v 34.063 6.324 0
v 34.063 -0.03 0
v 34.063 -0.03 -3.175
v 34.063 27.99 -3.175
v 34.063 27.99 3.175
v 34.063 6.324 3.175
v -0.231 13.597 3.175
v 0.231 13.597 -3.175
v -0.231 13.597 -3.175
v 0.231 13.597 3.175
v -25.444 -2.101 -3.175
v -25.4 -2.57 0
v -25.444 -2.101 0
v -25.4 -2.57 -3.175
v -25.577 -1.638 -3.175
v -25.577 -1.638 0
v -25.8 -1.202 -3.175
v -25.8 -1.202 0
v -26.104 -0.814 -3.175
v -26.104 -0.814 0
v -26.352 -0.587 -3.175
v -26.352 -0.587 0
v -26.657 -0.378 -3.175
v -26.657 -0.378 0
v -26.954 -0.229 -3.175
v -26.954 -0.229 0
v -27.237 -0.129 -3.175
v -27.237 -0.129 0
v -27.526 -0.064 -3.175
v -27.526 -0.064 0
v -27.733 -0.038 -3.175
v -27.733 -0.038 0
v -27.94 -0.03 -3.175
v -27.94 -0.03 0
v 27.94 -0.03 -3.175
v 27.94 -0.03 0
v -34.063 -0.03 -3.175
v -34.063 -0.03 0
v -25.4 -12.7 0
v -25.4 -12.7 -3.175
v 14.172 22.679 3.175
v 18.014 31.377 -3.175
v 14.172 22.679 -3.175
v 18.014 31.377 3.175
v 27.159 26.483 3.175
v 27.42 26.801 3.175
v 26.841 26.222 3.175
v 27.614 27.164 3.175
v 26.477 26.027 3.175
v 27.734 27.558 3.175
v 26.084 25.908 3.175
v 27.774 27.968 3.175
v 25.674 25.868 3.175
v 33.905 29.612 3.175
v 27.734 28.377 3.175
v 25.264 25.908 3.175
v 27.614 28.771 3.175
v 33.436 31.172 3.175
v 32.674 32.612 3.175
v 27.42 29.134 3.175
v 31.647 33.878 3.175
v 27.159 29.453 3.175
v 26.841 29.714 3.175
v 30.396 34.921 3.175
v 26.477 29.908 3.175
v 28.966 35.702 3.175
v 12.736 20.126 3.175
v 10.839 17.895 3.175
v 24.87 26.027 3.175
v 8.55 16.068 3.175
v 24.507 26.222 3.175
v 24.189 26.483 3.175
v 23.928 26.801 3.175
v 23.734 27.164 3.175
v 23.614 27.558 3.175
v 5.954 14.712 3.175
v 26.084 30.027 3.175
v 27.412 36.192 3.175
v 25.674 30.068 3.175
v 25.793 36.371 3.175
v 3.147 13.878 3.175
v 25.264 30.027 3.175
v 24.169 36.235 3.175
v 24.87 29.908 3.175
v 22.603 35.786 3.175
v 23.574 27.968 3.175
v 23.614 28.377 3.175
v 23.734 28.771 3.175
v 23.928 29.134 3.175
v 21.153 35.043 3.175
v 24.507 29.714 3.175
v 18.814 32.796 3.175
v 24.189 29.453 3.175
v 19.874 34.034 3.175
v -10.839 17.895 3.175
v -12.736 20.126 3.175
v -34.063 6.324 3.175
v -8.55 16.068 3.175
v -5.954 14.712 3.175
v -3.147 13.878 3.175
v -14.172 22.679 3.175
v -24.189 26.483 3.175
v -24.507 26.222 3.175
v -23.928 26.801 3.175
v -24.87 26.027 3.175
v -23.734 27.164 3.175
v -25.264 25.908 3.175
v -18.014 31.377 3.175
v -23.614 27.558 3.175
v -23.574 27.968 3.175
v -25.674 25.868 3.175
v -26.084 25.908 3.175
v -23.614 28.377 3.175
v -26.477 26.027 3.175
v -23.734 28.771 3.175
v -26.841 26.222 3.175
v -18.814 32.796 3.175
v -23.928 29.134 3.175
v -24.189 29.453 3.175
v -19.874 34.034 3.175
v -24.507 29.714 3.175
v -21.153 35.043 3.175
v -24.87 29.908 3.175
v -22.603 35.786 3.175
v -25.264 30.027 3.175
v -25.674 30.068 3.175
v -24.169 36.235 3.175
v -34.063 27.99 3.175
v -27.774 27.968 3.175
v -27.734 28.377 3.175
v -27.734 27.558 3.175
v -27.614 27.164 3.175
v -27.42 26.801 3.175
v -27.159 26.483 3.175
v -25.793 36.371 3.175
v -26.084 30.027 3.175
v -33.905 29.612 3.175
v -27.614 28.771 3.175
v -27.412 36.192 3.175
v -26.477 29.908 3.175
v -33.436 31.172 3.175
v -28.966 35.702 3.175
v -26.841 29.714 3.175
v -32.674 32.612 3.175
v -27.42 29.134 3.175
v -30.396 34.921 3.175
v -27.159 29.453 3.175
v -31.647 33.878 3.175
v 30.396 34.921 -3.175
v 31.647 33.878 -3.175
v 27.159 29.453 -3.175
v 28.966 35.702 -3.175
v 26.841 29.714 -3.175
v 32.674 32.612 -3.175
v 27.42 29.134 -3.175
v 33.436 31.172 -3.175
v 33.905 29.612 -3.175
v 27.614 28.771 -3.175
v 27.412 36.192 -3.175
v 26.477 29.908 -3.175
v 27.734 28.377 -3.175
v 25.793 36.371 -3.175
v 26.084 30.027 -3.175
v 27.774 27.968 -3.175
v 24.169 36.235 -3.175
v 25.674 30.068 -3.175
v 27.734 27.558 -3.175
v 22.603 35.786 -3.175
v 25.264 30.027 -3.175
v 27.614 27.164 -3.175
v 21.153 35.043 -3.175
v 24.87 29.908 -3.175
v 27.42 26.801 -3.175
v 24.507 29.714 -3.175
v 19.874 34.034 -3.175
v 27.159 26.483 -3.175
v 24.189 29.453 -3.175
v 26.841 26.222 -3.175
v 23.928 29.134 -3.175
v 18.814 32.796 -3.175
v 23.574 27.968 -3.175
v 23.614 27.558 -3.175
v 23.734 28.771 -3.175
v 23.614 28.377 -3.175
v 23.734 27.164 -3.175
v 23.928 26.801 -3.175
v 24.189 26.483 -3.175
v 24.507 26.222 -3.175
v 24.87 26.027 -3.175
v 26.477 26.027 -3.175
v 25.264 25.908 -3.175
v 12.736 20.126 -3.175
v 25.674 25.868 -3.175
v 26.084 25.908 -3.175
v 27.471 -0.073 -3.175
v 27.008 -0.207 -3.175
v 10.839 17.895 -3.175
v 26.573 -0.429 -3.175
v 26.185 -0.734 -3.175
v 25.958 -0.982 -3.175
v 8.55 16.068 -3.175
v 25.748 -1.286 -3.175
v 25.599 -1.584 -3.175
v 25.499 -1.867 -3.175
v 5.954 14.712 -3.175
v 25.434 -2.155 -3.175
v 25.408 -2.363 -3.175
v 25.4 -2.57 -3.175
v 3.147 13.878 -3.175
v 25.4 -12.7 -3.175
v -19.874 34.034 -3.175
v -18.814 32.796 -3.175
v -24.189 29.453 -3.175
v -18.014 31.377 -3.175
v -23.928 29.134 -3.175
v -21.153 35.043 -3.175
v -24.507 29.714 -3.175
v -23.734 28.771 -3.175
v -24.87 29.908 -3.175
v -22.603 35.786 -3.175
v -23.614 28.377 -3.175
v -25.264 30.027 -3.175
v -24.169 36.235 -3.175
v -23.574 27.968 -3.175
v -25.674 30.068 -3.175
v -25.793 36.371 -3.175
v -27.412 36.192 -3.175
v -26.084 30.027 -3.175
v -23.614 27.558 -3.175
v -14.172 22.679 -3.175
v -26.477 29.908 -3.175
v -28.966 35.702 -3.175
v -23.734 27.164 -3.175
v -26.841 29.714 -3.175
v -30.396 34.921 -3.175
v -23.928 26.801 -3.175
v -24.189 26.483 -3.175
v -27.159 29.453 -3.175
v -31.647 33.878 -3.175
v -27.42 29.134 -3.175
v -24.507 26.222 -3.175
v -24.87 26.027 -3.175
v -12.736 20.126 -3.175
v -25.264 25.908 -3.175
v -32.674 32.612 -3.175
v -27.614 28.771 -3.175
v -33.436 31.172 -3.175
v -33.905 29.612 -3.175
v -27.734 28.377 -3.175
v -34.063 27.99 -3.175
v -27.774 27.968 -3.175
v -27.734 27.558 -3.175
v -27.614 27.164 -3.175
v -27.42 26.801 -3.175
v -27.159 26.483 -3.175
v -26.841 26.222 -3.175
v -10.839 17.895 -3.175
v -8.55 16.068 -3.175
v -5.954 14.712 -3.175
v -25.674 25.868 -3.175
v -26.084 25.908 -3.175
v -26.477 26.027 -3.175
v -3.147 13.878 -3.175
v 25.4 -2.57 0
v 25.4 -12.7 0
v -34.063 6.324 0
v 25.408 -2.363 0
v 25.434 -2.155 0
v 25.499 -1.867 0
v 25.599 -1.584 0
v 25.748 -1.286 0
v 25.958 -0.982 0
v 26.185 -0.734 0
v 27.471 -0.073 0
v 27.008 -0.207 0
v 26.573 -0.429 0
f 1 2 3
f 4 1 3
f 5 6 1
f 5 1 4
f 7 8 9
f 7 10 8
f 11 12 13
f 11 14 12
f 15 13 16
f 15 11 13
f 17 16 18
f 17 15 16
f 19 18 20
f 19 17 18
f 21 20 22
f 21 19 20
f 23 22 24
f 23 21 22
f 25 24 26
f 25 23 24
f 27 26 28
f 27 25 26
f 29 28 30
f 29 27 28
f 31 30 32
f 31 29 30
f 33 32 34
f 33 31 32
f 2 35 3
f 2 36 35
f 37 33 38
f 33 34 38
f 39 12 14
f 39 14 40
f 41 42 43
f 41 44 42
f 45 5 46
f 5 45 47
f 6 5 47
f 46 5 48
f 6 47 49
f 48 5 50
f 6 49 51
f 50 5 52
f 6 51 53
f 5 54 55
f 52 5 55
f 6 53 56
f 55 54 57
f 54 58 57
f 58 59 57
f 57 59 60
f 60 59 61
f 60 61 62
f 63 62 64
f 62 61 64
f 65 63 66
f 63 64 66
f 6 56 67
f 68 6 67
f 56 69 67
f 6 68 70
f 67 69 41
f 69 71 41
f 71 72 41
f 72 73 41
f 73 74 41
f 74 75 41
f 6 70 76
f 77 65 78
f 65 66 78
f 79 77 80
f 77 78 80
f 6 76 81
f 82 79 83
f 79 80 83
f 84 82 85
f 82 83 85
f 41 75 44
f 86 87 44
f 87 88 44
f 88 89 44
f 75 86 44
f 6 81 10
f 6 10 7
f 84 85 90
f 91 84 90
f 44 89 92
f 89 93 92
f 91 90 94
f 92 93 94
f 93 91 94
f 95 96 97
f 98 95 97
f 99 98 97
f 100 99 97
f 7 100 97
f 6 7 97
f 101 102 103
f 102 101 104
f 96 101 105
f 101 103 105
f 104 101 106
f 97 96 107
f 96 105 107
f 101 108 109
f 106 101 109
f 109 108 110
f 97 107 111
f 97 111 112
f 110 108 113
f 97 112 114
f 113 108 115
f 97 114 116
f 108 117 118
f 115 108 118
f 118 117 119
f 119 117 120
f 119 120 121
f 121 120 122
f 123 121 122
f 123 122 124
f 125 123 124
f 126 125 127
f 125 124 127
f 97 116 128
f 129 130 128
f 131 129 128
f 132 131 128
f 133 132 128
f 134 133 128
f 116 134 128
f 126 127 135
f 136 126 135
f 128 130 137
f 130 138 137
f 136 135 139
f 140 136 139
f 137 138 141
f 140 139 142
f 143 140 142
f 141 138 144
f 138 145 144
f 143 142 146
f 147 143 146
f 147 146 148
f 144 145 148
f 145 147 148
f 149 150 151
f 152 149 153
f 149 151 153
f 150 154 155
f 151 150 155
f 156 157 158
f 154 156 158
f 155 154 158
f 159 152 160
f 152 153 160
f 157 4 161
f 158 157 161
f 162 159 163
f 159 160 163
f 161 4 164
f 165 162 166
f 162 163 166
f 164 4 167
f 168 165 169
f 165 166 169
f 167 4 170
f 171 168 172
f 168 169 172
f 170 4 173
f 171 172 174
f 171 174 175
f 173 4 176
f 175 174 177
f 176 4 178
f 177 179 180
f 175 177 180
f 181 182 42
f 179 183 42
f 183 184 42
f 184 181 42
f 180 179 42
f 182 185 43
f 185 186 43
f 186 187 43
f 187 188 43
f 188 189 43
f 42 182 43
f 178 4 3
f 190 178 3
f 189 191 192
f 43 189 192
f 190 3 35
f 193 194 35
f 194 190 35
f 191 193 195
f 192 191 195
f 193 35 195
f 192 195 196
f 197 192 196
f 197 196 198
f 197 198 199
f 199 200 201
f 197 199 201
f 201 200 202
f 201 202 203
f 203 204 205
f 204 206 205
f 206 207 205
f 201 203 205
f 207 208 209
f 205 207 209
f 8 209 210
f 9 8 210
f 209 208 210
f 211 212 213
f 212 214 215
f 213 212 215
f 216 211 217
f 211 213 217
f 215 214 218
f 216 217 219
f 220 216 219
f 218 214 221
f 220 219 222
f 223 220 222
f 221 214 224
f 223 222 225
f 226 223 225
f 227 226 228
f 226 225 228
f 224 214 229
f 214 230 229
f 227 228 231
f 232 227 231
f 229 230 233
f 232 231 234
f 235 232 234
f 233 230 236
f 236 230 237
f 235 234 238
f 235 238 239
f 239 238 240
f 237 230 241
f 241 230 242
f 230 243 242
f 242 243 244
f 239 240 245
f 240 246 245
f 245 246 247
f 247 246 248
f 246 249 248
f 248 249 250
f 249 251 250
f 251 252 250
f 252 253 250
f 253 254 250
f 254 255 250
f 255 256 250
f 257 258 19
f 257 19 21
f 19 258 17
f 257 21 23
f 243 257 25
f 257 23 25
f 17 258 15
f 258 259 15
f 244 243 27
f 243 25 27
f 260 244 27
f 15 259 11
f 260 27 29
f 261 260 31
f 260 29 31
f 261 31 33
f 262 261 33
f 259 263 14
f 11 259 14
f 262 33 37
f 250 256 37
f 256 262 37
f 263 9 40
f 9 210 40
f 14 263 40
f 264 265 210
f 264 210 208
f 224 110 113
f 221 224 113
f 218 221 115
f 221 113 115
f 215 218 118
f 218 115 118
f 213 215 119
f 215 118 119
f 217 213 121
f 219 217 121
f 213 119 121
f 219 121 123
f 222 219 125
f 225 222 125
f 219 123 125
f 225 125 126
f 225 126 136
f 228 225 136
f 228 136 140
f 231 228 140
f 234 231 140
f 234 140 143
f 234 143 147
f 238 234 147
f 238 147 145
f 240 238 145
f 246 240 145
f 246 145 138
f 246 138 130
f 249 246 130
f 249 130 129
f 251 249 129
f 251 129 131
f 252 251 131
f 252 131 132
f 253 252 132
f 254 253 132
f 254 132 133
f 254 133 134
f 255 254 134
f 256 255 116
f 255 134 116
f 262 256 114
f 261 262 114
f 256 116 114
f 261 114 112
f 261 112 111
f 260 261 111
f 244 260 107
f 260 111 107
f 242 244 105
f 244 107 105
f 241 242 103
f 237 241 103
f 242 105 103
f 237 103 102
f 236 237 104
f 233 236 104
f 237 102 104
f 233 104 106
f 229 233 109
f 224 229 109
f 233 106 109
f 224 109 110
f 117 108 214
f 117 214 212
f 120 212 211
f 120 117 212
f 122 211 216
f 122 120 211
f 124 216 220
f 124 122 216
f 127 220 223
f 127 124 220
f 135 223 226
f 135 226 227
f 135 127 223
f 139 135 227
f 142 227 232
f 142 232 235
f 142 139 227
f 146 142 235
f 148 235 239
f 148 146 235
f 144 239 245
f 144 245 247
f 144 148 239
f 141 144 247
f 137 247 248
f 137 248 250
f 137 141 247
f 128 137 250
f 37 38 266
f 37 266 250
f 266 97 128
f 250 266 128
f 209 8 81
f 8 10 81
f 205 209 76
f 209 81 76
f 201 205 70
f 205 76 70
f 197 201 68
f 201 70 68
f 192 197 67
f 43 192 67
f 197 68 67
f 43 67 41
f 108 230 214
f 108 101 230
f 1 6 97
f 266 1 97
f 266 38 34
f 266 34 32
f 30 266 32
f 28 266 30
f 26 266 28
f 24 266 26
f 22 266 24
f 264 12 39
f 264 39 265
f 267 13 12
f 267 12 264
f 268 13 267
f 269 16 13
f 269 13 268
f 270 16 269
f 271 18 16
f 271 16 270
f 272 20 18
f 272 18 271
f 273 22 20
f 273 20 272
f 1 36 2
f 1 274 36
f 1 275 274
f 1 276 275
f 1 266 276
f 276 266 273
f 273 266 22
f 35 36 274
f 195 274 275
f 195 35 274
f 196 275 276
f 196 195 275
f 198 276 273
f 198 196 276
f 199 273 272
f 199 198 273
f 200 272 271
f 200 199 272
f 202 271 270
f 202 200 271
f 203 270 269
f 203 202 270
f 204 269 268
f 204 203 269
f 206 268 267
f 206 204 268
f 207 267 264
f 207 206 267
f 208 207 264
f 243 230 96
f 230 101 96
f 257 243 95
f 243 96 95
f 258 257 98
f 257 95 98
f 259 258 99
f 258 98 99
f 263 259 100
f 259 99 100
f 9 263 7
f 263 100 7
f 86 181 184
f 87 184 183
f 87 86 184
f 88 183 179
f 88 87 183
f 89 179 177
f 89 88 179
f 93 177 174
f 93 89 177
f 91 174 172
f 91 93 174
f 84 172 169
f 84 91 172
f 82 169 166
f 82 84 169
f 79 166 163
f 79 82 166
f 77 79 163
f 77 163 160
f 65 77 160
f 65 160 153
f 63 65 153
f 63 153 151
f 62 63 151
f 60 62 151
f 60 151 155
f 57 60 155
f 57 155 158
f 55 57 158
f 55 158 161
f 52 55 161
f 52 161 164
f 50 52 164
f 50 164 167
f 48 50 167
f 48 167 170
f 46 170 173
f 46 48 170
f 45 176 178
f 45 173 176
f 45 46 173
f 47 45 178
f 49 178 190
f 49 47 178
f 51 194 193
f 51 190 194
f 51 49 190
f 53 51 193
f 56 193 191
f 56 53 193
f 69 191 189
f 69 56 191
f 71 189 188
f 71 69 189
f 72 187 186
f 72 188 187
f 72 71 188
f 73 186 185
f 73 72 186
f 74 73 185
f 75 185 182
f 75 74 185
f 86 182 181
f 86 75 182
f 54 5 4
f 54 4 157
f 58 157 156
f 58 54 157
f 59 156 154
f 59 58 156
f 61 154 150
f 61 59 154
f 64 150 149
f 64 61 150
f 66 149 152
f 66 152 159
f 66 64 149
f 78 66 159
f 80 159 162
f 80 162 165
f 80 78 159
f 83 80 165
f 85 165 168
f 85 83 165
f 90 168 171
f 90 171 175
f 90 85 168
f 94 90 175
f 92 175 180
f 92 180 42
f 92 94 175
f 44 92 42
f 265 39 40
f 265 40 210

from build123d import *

# Parameters (mm, degrees)
BOSS_EXTRU_1_DEPTH             = 3.175
ESQUISSE3_R                    = 2.1
ENL_V_MAT_EXTRU_1_DEPTH        = 51.235046687
ENL_V_MAT_EXTRU_2_DEPTH        = 3.175
CONG_1_R                       = 15.24
CONG_2_R                       = 15.24
BOSS_EXTRU_3_REACH             = 51.933
BOSS_EXTRU_3_DIRECTION_2_REACH = 51.933
ENL_V_MAT_EXTRU_3_DEPTH        = 3.175
CONG_3_R                       = 2.54


with BuildPart() as part:
    # Esquisse2 → Boss.-Extru.1 (new, symmetric)
    with BuildSketch(Plane.XY):
        with BuildLine():
            Line((25.4, 0), (33.652960284, 25.4))
            ThreePointArc((33.652960284, 25.4), (28.67359617, 35.819836664), (18.013926444, 31.377032999))
            Line((18.013926444, 31.377032999), (10.16, 13.597032999))
            Line((10.16, 13.597032999), (-10.16, 13.597032999))
            Line((-10.16, 13.597032999), (-18.013926444, 31.377032999))
            ThreePointArc((-18.013926444, 31.377032999), (-28.67359617, 35.819836664), (-33.652960284, 25.4))
            Line((-33.652960284, 25.4), (-25.4, 0))
            Line((-25.4, 0), (-25.4, -12.7))
            Line((-25.4, -12.7), (25.4, -12.7))
            Line((25.4, -12.7), (25.4, 0))
        make_face()
    extrude(amount=BOSS_EXTRU_1_DEPTH, both=True)

    # Esquisse3 → Enlèv. mat.-Extru.1 (cut, through all)
    with BuildSketch(Plane.XY.offset(3.175)):
        with Locations((-25.673864308, 27.96758946)):
            Circle(ESQUISSE3_R)
    enl_v_mat_extru_1 = extrude(amount=-ENL_V_MAT_EXTRU_1_DEPTH, mode=Mode.SUBTRACT)

    # Symétrie1: Enlèv. mat.-Extru.1 across plane
    add(enl_v_mat_extru_1.mirror(Plane(origin=(0, 0, 0), x_dir=(0, 0, 1), z_dir=(1, 0, 0))), mode=Mode.SUBTRACT)

    # Esquisse4 → Enlèv. mat.-Extru.2 (cut)
    with BuildSketch(Plane.XY.offset(3.175)):
        Polygon((27.454849211, 6.324175587), (-27.454849211, 6.324175587), (-25.4, 0), (-25.4, -12.7), (25.4, -12.7), (25.4, 0), align=None)
    extrude(amount=-ENL_V_MAT_EXTRU_2_DEPTH, mode=Mode.SUBTRACT)

    # Congé1
    cong_1_edges = [part.edges().sort_by_distance(p)[0] for p in [
        (-10.16, 13.597032999, 0),
        (10.16, 13.597032999, 0),
    ]]
    fillet(cong_1_edges, radius=CONG_1_R)

    # Congé2
    cong_2_edges = [part.edges().sort_by_distance(p)[0] for p in [
        (-25.4, 0, -1.5875),
        (25.4, 0, -1.5875),
    ]]
    fillet(cong_2_edges, radius=CONG_2_R)

    # Boss.-Extru.3: up to this face of the body (flat: up to its plane)
    boss_extru_3_end = Plane(part.part.faces().sort_by_distance((-16.773966377, 26.7272166, 3.175))[0])
    # Esquisse8 → Boss.-Extru.3 (add, up to the picked face)
    with BuildSketch(Plane.XY, mode=Mode.PRIVATE) as boss_extru_3_sk1:
        with BuildLine():
            Line((-27.454849211, 6.324175587), (-26.145898692, 2.295640124))
            ThreePointArc((-26.145898692, 2.295640124), (-25.821082413, 1.143928475), (-25.587629689, -0.029717623))
            Line((-25.587629689, -0.029717623), (-34.063204565, -0.029717623))
            Line((-34.063204565, -0.029717623), (-34.063204565, 27.990180447))
            ThreePointArc((-34.063204565, 27.990180447), (-33.960008236, 26.678946761), (-33.652960284, 25.4))
            Line((-33.652960284, 25.4), (-27.454849211, 6.324175587))
        make_face()
    boss_extru_3_tool1 = split(extrude(boss_extru_3_sk1.sketch, amount=BOSS_EXTRU_3_REACH, mode=Mode.PRIVATE), bisect_by=boss_extru_3_end, keep=Keep.BOTH, mode=Mode.PRIVATE)
    boss_extru_3 = boss_extru_3_tool1.solids().sort_by(Axis((-31.181863, 8.892932, 0), (0, 0, 1)))[0]
    add(boss_extru_3)

    # Boss.-Extru.3 direction 2: up to this face of the body (flat: up to its plane)
    boss_extru_3_direction_2_end = Plane(part.part.faces().sort_by_distance((0, 8.816587411, -3.175))[0])
    # Esquisse8 → Boss.-Extru.3 direction 2 (add, up to the picked face)
    with BuildSketch(Plane.XY, mode=Mode.PRIVATE) as boss_extru_3_direction_2_sk1:
        with BuildLine():
            Line((-27.454849211, 6.324175587), (-26.145898692, 2.295640124))
            ThreePointArc((-26.145898692, 2.295640124), (-25.821082413, 1.143928475), (-25.587629689, -0.029717623))
            Line((-25.587629689, -0.029717623), (-34.063204565, -0.029717623))
            Line((-34.063204565, -0.029717623), (-34.063204565, 27.990180447))
            ThreePointArc((-34.063204565, 27.990180447), (-33.960008236, 26.678946761), (-33.652960284, 25.4))
            Line((-33.652960284, 25.4), (-27.454849211, 6.324175587))
        make_face()
    boss_extru_3_direction_2_tool1 = split(extrude(boss_extru_3_direction_2_sk1.sketch, amount=-BOSS_EXTRU_3_DIRECTION_2_REACH, mode=Mode.PRIVATE), bisect_by=boss_extru_3_direction_2_end, keep=Keep.BOTH, mode=Mode.PRIVATE)
    boss_extru_3_direction_2 = boss_extru_3_direction_2_tool1.solids().sort_by(Axis((-31.181863, 8.892932, 0), (0, 0, -1)))[0]
    add(boss_extru_3_direction_2)

    # Symétrie2: Boss.-Extru.3, Boss.-Extru.3 direction 2 across plane
    add(boss_extru_3.mirror(Plane(origin=(0, 0, 0), x_dir=(0, 0, 1), z_dir=(1, 0, 0))))
    add(boss_extru_3_direction_2.mirror(Plane(origin=(0, 0, 0), x_dir=(0, 0, 1), z_dir=(1, 0, 0))))

    # Esquisse9 → Enlèv. mat.-Extru.3 (cut)
    with BuildSketch(Plane.XY.offset(3.175)):
        with BuildLine():
            Line((-27.454849211, 6.324175587), (-26.145898692, 2.295640124))
            ThreePointArc((-26.145898692, 2.295640124), (-25.821082413, 1.143928475), (-25.587629689, -0.029717623))
            Line((-25.587629689, -0.029717623), (-34.063204565, -0.029717623))
            Line((-34.063204565, -0.029717623), (-34.063204565, 6.324175587))
            Line((-34.063204565, 6.324175587), (-27.454849211, 6.324175587))
        make_face()
    enl_v_mat_extru_3 = extrude(amount=-ENL_V_MAT_EXTRU_3_DEPTH, mode=Mode.SUBTRACT)

    # Symétrie3: Enlèv. mat.-Extru.3 across plane
    add(enl_v_mat_extru_3.mirror(Plane(origin=(0, 0, 0), x_dir=(0, 0, 1), z_dir=(1, 0, 0))), mode=Mode.SUBTRACT)

    # Congé3
    cong_3_edges = [part.edges().sort_by_distance(p)[0] for p in [
        (25.587629689, -0.029717623, -1.5875),
        (-25.587629689, -0.029717623, -1.5875),
    ]]
    fillet(cong_3_edges, radius=CONG_3_R)


solid = part.part
